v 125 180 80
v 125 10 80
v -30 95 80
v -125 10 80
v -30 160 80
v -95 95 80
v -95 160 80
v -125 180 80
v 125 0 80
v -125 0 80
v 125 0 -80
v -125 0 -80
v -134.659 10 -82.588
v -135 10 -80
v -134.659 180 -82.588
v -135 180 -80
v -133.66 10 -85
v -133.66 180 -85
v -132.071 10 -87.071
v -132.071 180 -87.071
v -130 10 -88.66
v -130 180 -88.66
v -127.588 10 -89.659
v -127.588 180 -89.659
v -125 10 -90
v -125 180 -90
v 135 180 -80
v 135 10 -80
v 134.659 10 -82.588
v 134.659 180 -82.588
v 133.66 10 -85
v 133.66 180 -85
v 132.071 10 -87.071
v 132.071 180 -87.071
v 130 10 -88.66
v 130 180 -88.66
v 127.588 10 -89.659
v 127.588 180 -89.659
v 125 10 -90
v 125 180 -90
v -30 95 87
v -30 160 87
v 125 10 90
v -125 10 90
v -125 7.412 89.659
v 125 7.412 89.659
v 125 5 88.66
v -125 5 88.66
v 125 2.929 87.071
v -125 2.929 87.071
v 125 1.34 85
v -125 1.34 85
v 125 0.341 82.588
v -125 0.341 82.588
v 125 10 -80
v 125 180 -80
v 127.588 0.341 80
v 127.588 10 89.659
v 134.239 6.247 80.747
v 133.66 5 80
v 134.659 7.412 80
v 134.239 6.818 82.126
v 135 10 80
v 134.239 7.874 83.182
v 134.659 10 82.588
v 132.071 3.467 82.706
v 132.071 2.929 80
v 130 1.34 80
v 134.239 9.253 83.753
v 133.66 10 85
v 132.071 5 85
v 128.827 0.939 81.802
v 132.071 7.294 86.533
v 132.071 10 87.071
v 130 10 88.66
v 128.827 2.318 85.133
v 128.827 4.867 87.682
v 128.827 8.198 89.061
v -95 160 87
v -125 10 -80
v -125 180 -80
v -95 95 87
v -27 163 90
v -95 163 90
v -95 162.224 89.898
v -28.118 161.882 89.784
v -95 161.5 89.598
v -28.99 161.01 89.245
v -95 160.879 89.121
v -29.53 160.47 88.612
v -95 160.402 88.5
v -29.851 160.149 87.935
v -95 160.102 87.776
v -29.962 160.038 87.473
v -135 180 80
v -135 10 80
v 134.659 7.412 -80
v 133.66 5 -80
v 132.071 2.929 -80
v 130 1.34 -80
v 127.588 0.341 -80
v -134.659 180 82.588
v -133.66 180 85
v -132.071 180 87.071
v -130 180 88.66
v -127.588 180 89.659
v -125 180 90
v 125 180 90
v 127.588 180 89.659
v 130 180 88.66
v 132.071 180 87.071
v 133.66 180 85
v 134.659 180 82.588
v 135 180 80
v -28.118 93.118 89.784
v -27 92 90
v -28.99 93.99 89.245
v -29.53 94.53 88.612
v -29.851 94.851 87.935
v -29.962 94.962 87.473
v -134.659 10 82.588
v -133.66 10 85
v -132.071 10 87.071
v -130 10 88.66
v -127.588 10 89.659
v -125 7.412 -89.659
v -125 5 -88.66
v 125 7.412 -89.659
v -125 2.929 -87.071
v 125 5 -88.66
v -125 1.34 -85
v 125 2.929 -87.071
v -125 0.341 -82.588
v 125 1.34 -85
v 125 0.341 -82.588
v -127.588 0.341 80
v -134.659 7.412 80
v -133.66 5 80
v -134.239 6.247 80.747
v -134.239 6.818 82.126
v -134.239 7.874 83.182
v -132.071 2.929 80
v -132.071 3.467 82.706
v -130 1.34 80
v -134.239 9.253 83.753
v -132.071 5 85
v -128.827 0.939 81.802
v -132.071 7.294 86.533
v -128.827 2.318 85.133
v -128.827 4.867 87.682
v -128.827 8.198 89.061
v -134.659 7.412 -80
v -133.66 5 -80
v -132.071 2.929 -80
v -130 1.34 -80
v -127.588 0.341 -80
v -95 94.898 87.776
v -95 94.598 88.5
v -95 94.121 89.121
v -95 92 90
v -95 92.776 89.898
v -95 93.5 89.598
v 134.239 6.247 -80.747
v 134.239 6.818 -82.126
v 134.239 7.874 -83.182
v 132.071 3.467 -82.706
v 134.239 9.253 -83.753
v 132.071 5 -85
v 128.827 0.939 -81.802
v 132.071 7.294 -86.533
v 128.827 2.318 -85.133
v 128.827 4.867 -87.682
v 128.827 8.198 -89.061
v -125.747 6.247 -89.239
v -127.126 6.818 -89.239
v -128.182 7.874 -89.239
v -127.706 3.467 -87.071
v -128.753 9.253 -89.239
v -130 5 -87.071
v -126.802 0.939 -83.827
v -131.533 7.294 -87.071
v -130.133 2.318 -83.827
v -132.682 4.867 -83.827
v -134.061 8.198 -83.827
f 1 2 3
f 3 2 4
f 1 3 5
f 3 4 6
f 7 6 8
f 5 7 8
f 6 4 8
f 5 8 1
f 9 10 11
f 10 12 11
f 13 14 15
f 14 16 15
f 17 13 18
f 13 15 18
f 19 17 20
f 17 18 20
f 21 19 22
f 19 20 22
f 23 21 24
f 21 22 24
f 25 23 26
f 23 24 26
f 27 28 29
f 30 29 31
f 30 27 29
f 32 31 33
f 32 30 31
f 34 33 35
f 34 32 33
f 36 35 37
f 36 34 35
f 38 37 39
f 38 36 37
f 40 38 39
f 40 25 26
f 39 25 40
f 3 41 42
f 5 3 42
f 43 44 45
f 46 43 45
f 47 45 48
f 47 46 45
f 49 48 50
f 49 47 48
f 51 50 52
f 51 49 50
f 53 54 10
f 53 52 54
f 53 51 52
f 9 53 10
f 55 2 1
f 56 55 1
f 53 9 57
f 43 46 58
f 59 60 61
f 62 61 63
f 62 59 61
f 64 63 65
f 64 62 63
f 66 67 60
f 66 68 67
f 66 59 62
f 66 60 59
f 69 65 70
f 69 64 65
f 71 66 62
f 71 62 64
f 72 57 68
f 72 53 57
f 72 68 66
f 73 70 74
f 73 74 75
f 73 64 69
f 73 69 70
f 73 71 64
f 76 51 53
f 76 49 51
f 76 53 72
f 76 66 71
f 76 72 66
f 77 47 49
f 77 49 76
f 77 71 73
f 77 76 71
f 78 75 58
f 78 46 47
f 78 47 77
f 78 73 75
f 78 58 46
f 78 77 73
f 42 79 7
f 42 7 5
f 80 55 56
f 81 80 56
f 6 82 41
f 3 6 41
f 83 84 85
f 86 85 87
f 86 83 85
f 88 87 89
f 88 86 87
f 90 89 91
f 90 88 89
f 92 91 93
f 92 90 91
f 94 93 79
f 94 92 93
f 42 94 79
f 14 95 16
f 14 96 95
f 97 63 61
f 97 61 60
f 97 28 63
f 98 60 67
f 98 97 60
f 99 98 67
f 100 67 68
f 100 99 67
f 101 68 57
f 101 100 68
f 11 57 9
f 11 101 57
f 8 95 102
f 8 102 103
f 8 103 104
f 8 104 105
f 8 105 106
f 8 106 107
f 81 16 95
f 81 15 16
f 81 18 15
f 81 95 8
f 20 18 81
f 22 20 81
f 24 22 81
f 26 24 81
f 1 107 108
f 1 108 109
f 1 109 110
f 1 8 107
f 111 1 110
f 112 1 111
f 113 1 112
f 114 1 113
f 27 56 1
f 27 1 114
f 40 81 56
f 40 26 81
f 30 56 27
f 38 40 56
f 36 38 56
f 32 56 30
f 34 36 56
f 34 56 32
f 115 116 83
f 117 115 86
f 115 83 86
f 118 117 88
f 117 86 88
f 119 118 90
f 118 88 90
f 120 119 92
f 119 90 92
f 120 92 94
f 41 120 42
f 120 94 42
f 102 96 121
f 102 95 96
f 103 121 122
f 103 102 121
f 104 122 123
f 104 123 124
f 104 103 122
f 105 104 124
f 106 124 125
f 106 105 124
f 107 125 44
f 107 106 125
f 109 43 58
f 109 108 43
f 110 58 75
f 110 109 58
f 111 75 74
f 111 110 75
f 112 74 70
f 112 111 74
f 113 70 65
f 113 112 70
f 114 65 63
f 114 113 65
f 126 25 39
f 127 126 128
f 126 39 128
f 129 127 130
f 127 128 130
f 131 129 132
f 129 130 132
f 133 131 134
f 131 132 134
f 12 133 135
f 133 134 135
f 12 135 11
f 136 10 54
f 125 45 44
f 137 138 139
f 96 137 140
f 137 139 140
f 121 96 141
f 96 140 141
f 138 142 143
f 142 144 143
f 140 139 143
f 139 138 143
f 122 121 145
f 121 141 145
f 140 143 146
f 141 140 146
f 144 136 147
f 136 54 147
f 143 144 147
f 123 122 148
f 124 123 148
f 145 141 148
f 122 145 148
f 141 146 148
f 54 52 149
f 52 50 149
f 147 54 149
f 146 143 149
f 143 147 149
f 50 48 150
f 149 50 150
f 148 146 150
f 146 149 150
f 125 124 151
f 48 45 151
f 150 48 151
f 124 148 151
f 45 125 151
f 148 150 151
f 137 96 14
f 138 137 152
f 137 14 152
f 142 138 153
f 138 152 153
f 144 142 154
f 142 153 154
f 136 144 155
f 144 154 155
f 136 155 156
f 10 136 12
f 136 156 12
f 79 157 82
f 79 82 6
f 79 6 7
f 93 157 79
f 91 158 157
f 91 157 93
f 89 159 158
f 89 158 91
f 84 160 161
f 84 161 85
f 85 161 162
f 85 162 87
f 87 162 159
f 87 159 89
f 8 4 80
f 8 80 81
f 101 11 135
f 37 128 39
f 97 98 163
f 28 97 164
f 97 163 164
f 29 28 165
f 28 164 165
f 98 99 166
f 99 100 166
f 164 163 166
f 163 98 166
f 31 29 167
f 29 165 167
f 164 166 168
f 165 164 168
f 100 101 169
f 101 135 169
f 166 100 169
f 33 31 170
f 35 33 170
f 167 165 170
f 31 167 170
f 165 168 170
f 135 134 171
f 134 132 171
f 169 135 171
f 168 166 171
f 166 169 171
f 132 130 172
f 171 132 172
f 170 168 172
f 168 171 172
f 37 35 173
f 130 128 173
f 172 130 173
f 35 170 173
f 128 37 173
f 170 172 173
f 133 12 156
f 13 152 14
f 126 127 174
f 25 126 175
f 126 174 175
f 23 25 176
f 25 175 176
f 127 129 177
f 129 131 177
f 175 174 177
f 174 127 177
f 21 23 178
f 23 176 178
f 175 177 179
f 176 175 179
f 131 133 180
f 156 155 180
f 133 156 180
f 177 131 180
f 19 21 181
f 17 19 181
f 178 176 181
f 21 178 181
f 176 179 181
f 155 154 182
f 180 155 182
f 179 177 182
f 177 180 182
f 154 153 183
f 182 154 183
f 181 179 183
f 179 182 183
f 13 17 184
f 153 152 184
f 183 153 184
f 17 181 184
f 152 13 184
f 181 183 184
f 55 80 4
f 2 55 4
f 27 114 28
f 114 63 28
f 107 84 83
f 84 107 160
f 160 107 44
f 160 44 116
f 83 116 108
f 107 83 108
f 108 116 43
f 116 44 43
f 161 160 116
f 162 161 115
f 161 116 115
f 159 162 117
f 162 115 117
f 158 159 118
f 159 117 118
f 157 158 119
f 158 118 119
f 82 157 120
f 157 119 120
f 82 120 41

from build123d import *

# Parameters (mm, degrees)
SKETCH1_W        = 270
SKETCH1_H        = 180
EXTRUDE1_DEPTH   = 180
FILLET1_R        = 10
SHELL1_START     = -125
SHELL1_OUTLINE_W = 170
SHELL1_OUTLINE_H = 160
SHELL1_DEPTH     = 250
SKETCH2_W        = 65
SKETCH2_H        = 65
EXTRUDE2_DEPTH   = 20
FILLET2_R        = 3


# Read off the part's stored shape, not the designer's step: Shell1
with BuildPart() as part:
    # Sketch1 → Extrude1 (new body)
    with BuildSketch(Plane(origin=(0, 0, 0), x_dir=(1, 0, 0), z_dir=(0, 1, 0))):
        Rectangle(SKETCH1_W, SKETCH1_H)
    extrude(amount=EXTRUDE1_DEPTH)

    # Fillet1
    fillet1_edges = [part.edges().sort_by_distance(p)[0] for p in [
        (0, 0, 90),
        (-135, 0, 0),
        (0, 0, -90),
        (135, 0, 0),
        (135, 90, 90),
        (-135, 90, 90),
        (-135, 90, -90),
        (135, 90, -90),
    ]]
    fillet(fillet1_edges, radius=FILLET1_R)

    # Shell1 outline → Shell1 (cut)
    with BuildSketch(Plane.YZ.offset(SHELL1_START)):
        with Locations((95, 0)):
            Rectangle(SHELL1_OUTLINE_W, SHELL1_OUTLINE_H)
    extrude(amount=SHELL1_DEPTH, mode=Mode.SUBTRACT)

    # Sketch2 → Extrude2 (cut)
    with BuildSketch(Plane.XY.offset(90)):
        with Locations((-62.5, 127.5)):
            Rectangle(SKETCH2_W, SKETCH2_H)
    extrude(amount=-EXTRUDE2_DEPTH, mode=Mode.SUBTRACT)

    # Fillet2
    fillet2_edges = [part.edges().sort_by_distance(p)[0] for p in [
        (-62.5, 95, 90),
        (-30, 127.5, 90),
        (-62.5, 160, 90),
    ]]
    fillet(fillet2_edges, radius=FILLET2_R)


solid = part.part
